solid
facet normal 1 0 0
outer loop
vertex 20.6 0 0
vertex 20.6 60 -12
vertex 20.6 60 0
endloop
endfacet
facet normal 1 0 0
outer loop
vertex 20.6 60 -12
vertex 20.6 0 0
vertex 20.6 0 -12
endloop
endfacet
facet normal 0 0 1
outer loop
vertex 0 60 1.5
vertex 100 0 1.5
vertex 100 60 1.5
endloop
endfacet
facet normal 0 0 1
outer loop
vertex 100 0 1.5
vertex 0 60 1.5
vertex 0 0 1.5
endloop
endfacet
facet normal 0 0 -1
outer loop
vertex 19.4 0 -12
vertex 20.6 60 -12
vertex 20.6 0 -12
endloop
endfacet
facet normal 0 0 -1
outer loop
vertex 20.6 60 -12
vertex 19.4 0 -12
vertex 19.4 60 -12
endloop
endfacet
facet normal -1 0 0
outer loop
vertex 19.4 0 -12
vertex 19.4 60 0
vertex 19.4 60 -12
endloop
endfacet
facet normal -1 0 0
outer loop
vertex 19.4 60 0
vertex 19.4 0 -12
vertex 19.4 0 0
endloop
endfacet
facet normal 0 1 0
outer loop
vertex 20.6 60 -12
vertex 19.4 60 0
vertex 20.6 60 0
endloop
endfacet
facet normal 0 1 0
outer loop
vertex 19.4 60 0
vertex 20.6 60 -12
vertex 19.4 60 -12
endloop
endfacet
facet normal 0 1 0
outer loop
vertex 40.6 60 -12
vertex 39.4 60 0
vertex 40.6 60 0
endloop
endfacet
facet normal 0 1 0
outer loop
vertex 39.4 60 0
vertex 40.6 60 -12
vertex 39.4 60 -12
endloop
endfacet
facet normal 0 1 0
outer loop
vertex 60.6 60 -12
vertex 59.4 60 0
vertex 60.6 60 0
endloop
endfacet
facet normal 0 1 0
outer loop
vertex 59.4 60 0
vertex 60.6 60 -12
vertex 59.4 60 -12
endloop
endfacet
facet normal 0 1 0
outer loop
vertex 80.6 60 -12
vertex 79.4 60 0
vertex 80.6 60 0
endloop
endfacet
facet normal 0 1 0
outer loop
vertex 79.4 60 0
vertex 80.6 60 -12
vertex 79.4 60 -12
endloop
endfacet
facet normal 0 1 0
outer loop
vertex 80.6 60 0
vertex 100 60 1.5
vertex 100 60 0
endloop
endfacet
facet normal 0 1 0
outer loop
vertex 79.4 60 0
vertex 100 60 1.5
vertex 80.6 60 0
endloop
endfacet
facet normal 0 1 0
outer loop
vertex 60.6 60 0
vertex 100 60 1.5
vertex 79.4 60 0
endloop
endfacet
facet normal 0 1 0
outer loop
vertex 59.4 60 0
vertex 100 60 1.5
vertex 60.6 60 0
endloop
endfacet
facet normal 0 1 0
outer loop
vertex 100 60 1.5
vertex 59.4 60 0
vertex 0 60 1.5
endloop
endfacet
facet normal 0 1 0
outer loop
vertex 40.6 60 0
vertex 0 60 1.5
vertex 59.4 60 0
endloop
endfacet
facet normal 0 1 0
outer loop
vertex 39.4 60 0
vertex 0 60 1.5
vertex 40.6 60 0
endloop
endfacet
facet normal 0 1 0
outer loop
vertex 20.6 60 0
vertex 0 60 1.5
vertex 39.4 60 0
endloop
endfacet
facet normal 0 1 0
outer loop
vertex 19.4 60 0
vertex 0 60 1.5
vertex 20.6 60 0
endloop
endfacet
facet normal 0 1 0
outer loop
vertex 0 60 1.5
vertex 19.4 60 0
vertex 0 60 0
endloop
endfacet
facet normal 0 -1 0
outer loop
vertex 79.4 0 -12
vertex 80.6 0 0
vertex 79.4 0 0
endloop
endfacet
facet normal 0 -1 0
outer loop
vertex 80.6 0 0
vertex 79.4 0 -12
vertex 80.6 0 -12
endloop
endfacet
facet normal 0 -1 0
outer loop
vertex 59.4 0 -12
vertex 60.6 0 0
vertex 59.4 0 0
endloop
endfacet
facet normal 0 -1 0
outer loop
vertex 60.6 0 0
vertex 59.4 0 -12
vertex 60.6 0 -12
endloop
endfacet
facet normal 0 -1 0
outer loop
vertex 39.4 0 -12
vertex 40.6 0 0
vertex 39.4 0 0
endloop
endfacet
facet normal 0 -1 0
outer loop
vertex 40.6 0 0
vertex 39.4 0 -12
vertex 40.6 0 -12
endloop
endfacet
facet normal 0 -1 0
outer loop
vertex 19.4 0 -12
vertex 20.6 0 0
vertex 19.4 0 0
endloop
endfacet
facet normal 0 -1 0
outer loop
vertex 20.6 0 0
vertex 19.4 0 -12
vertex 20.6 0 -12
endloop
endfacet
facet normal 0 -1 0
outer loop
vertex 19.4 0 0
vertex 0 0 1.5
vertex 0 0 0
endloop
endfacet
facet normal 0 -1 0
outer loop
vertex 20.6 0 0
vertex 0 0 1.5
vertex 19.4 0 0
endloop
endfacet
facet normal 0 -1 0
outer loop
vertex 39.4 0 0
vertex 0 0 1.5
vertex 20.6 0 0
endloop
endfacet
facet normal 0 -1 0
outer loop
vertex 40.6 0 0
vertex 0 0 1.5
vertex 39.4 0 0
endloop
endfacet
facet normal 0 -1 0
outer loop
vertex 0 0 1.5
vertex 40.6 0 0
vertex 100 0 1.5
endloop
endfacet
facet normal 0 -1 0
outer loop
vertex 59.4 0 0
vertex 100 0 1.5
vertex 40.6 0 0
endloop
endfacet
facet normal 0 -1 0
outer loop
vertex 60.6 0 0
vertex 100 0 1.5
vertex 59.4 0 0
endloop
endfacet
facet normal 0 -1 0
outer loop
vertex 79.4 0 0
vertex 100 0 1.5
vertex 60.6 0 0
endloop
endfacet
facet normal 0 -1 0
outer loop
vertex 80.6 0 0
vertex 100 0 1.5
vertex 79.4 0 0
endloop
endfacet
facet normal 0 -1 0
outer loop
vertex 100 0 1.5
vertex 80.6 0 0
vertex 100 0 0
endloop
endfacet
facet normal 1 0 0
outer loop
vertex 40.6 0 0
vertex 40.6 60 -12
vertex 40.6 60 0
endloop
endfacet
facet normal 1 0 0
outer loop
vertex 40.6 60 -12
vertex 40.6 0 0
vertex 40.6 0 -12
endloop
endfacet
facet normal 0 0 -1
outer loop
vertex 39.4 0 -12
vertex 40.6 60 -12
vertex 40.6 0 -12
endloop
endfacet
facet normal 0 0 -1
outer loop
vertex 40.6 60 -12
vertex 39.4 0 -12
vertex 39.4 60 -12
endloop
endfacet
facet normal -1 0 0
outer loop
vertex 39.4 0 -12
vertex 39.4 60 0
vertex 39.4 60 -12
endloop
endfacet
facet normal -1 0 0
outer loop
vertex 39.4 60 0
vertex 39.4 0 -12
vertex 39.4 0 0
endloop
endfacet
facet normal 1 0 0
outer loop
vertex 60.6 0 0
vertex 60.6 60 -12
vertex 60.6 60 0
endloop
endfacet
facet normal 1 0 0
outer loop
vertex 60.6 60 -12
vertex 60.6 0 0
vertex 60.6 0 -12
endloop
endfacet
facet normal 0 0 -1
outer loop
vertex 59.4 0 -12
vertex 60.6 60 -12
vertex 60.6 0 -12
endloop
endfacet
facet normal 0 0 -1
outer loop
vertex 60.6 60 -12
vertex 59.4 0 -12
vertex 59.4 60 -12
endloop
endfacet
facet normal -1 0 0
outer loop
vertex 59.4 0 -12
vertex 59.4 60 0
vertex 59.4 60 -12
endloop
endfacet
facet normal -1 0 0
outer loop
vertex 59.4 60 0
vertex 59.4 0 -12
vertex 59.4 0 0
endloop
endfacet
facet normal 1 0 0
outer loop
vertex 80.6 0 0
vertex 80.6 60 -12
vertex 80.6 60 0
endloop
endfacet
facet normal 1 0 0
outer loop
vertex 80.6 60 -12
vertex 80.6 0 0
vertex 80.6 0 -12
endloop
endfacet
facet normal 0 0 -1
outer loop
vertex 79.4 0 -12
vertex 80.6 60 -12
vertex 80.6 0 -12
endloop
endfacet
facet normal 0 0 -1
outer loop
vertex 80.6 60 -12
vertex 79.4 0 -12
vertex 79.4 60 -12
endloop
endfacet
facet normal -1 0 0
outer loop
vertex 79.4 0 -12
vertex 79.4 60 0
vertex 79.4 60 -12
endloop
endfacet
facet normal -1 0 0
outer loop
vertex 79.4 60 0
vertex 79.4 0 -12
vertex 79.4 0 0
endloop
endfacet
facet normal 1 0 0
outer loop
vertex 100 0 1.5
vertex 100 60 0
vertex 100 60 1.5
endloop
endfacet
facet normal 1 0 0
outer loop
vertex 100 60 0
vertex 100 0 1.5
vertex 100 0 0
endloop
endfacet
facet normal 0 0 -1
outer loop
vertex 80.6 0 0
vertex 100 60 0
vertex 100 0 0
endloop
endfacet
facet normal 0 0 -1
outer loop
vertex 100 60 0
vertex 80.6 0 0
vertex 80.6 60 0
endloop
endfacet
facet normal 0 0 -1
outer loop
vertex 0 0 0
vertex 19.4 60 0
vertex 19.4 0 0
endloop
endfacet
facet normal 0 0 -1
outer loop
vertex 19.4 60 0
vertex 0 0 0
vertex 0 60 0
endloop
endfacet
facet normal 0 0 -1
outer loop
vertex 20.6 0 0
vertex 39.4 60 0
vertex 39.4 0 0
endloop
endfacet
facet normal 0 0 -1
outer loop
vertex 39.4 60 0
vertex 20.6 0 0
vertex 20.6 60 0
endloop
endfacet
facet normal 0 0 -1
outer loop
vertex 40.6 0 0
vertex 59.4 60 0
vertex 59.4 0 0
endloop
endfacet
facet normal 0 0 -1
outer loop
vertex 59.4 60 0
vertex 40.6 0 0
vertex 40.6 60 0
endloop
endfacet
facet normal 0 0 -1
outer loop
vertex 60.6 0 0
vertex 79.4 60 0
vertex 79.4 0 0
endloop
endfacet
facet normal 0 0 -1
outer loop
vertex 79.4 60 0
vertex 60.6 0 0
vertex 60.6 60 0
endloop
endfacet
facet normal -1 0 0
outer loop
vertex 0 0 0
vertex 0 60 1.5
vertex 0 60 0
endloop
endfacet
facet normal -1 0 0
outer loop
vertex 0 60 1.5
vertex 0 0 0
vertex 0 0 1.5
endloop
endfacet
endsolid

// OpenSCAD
$fn = 32;

// ----------------------------------------------------------------------
// Ribbed panel: 1.5 mm panel
// ----------------------------------------------------------------------

// --- parameters (mm) ---
panel_l = 100;            // panel length, X
panel_w = 60;             // panel width, Y
panel_t = 1.5;            // panel thickness, Z
rib_t = 1.2;              // rib thickness
rib_h = 12;               // rib height below the panel
ribs = 4;                 // number of ribs

total_h = panel_t + rib_h;  // overall height

union() {
  cube([panel_l, panel_w, panel_t]);
  for (i = [1 : ribs])
    translate([i * panel_l / (ribs + 1) - rib_t / 2, 0, -rib_h])
      cube([rib_t, panel_w, rib_h + panel_t]);
}
